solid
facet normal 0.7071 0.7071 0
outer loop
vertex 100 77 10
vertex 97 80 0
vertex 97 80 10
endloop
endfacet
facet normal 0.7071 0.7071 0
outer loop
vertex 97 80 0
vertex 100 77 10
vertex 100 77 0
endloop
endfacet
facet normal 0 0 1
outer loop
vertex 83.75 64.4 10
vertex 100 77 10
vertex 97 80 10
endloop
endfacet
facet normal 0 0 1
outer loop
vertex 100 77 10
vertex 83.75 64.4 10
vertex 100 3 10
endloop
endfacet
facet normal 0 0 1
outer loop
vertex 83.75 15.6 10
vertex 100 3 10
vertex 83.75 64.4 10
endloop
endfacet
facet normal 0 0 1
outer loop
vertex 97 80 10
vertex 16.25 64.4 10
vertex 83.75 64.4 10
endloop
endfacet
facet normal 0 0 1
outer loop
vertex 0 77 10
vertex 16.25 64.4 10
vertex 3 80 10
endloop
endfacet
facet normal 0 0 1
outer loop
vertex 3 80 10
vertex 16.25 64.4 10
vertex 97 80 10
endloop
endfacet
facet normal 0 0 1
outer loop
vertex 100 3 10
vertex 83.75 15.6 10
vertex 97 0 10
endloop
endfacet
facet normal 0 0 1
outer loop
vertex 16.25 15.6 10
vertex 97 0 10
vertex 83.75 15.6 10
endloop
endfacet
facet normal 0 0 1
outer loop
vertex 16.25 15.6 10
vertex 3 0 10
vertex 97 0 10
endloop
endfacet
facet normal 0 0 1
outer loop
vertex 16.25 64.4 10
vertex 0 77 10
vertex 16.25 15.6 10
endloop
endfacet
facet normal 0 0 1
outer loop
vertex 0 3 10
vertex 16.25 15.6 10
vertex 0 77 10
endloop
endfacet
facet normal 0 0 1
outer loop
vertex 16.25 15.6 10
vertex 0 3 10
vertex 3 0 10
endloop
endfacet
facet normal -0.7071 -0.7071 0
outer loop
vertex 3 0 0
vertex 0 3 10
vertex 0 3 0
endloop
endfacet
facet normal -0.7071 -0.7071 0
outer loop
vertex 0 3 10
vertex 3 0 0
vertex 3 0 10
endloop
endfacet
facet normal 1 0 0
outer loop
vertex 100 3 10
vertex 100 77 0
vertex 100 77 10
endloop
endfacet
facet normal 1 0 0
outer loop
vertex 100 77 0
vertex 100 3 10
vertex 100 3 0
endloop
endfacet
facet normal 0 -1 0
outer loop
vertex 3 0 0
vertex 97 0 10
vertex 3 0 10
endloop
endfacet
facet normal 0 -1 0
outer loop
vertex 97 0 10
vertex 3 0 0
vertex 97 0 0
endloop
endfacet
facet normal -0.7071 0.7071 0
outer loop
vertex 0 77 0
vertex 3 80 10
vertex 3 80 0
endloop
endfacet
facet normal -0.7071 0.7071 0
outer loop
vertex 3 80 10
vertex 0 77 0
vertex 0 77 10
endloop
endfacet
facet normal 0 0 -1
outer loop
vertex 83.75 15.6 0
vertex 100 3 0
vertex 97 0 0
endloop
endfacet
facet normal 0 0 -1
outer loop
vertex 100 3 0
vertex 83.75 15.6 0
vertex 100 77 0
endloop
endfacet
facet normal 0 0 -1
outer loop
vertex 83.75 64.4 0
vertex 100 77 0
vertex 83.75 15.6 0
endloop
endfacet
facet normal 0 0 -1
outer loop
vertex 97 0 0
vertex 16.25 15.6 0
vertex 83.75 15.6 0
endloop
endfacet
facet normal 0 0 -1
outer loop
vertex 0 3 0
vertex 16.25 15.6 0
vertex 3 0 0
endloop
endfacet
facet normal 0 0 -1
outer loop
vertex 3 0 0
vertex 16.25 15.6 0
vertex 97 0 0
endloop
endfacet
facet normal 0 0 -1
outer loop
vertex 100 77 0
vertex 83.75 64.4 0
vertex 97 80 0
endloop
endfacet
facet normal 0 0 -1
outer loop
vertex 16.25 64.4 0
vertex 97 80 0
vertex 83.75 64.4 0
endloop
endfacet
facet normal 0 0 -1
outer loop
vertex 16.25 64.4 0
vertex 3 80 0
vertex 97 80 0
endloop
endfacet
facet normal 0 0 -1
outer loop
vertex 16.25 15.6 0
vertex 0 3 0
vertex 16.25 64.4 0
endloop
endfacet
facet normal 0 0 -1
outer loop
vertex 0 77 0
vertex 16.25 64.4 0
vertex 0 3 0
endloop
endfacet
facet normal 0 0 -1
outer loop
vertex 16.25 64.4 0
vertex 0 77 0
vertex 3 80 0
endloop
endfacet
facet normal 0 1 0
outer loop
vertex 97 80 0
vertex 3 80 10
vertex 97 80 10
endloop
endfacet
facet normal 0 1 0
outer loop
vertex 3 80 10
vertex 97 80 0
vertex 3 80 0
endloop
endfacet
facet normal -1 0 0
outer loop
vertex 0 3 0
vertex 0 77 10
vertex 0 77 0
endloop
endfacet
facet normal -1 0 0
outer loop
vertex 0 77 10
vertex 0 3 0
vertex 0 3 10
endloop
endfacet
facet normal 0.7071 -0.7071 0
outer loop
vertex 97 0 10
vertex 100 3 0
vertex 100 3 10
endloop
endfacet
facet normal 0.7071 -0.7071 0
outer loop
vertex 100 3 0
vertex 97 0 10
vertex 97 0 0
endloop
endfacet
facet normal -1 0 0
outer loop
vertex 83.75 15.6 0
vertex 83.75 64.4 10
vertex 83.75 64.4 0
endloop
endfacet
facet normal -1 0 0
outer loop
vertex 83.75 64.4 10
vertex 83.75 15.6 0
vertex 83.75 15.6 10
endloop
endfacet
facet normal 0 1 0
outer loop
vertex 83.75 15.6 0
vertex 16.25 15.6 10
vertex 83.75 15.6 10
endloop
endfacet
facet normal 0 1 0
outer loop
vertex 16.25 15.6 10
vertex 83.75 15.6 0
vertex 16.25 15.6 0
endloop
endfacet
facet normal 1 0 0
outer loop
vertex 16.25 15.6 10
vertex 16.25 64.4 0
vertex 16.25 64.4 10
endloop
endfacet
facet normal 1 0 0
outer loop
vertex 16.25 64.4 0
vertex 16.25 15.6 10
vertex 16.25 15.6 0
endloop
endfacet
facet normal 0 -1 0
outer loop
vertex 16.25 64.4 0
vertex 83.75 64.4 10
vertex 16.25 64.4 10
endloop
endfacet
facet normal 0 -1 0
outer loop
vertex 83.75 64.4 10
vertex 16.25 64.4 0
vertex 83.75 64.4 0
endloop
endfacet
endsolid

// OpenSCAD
$fn = 32;

// ----------------------------------------------------------------------
// Windowed plate: 1 voids, 100 x 80 x 10 mm
// ----------------------------------------------------------------------

// --- parameters (mm) ---
plate_l = 100;            // plate length, X
plate_w = 80;             // plate width, Y
plate_t = 10;             // plate thickness, Z
edge_margin = 12;         // wall from the plate edge to any window
win1_l = 67.5;            // window length
win1_w = 48.8;            // window width
depth_1 = 10;             // depth of void 1 (full thickness = through)
corner_c = 3;             // corner chamfer of the plate
fit_tol = 0.1;            // declared fit tolerance (prompt contract)
free_tol = 0.5;           // declared free tolerance (prompt contract)

profile = [[3, 0], [97, 0], [100, 3], [100, 77], [97, 80], [3, 80], [0, 77], [0, 3]];  // primary outline, 8 points, counter clockwise
void_1 = [[16.25, 15.6], [83.75, 15.6], [83.75, 64.4], [16.25, 64.4]];  // large central window, 4 points

// --- the one profile operation ---
difference() {
  linear_extrude(height = plate_t) polygon(points = profile);
  translate([0, 0, -1])
    linear_extrude(height = plate_t + 2) polygon(points = void_1);
}
